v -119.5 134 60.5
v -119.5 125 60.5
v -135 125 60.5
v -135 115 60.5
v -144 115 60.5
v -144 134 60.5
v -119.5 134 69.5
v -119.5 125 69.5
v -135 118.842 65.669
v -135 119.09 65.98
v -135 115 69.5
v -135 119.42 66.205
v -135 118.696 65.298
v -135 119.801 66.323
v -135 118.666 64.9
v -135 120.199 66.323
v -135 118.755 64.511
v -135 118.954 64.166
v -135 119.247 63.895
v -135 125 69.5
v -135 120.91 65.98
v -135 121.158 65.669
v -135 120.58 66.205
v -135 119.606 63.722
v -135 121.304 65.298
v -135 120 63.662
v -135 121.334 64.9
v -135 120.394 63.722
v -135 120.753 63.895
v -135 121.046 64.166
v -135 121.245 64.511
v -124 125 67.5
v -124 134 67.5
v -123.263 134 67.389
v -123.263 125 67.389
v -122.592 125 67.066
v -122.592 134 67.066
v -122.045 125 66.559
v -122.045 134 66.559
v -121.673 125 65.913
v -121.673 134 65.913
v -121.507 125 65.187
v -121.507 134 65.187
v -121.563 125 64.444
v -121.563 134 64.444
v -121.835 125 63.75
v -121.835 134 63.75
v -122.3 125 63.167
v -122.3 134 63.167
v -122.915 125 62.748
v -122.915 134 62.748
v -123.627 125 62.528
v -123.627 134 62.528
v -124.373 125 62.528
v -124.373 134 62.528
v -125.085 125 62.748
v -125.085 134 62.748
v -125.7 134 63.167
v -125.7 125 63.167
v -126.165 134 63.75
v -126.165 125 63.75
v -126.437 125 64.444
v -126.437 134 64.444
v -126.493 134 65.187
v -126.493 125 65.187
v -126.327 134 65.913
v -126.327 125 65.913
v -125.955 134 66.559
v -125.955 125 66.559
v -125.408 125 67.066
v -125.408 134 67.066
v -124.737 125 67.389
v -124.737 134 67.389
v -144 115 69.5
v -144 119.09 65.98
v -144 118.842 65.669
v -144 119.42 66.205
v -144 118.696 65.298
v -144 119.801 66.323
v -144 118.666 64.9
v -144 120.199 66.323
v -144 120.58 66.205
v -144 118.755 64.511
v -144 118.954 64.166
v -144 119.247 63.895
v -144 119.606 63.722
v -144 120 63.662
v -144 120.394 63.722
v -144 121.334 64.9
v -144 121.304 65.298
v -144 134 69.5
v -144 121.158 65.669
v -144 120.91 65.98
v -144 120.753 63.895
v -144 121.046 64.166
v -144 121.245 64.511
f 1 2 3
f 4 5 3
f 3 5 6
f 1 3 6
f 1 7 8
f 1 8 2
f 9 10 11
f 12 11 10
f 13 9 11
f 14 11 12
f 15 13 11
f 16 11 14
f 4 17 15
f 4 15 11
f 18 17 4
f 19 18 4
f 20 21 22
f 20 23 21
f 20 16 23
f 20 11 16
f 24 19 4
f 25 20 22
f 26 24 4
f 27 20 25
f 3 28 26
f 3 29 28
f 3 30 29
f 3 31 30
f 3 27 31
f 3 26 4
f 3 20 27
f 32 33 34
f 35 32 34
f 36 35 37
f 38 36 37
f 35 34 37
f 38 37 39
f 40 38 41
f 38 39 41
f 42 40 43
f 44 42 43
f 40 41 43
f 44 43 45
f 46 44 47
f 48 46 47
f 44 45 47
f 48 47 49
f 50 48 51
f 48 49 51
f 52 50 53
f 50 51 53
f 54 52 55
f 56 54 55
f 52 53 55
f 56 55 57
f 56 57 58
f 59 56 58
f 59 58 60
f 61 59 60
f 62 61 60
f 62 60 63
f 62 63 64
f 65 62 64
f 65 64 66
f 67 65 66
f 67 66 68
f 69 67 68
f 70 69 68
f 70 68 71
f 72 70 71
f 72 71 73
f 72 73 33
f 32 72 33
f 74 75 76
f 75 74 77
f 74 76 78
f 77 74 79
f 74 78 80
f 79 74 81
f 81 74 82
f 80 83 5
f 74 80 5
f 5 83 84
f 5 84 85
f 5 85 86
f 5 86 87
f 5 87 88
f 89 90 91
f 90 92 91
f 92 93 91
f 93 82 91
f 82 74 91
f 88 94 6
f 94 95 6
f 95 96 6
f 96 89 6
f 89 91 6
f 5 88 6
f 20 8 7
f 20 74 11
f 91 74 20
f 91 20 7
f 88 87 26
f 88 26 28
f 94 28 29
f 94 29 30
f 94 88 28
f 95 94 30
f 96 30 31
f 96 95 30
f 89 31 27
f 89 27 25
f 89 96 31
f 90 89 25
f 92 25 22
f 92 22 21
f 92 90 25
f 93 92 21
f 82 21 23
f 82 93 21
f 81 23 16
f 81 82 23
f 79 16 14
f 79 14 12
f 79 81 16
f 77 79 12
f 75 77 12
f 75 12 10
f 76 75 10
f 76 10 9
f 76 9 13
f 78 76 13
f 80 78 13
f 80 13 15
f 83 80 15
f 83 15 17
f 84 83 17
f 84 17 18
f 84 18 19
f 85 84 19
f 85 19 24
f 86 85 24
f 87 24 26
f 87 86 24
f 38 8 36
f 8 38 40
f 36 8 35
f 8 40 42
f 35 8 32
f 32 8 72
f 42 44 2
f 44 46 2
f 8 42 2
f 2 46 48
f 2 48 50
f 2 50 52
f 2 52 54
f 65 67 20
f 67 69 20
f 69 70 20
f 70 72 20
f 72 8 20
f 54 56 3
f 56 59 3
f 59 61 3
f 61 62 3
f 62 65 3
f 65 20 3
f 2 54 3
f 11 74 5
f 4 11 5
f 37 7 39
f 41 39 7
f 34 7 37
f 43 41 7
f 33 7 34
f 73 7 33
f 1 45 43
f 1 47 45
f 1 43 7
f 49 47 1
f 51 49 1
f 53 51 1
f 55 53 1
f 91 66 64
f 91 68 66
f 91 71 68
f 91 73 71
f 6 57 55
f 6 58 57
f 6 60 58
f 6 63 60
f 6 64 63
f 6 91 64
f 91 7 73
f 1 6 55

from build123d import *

# Parameters (mm, degrees)
SKETCH057_W             = 9
SKETCH057_H             = 19
SKETCH057_R             = 1.3375
PAD030_DEPTH            = 9
SKETCH058_W             = 9
SKETCH058_H             = 9
PAD031_DEPTH            = 15.5
SKETCH059_R             = 2.5
POCKET026_DEPTH         = 19.001
BODY013_PLACEMENT_ANGLE = 90


with BuildPart() as part:
    # Sketch057 → Pad030 (new body)
    with BuildSketch(Plane.XY):
        with Locations((4.5, 9.5)):
            Rectangle(SKETCH057_W, SKETCH057_H)
        with Locations((4.5, 5)):
            Circle(SKETCH057_R, mode=Mode.SUBTRACT)
    extrude(amount=PAD030_DEPTH)

    # Sketch058 (on Face7 of Pad030) → Pad031 (join)
    with BuildSketch(Plane.XY.offset(9)):
        with Locations((4.5, 14.5)):
            Rectangle(SKETCH058_W, SKETCH058_H)
    extrude(amount=PAD031_DEPTH)

    # Sketch059 (on Face11 of Pad031) → Pocket026 (cut, through all)
    with BuildSketch(Plane(origin=(0, 19, 0), x_dir=(-1, 0, 0), z_dir=(0, 1, 0))):
        with Locations((-4.5, 20)):
            Circle(SKETCH059_R)
    extrude(amount=-POCKET026_DEPTH, mode=Mode.SUBTRACT)


with BuildPart() as part_1:
    # Body013 placement: moved
    add(part.part.moved(Location((-144, 115, 69.5))).rotate(Axis((-144, 115, 69.5), (0, 1, 0)), BODY013_PLACEMENT_ANGLE))


solid = part_1.part
